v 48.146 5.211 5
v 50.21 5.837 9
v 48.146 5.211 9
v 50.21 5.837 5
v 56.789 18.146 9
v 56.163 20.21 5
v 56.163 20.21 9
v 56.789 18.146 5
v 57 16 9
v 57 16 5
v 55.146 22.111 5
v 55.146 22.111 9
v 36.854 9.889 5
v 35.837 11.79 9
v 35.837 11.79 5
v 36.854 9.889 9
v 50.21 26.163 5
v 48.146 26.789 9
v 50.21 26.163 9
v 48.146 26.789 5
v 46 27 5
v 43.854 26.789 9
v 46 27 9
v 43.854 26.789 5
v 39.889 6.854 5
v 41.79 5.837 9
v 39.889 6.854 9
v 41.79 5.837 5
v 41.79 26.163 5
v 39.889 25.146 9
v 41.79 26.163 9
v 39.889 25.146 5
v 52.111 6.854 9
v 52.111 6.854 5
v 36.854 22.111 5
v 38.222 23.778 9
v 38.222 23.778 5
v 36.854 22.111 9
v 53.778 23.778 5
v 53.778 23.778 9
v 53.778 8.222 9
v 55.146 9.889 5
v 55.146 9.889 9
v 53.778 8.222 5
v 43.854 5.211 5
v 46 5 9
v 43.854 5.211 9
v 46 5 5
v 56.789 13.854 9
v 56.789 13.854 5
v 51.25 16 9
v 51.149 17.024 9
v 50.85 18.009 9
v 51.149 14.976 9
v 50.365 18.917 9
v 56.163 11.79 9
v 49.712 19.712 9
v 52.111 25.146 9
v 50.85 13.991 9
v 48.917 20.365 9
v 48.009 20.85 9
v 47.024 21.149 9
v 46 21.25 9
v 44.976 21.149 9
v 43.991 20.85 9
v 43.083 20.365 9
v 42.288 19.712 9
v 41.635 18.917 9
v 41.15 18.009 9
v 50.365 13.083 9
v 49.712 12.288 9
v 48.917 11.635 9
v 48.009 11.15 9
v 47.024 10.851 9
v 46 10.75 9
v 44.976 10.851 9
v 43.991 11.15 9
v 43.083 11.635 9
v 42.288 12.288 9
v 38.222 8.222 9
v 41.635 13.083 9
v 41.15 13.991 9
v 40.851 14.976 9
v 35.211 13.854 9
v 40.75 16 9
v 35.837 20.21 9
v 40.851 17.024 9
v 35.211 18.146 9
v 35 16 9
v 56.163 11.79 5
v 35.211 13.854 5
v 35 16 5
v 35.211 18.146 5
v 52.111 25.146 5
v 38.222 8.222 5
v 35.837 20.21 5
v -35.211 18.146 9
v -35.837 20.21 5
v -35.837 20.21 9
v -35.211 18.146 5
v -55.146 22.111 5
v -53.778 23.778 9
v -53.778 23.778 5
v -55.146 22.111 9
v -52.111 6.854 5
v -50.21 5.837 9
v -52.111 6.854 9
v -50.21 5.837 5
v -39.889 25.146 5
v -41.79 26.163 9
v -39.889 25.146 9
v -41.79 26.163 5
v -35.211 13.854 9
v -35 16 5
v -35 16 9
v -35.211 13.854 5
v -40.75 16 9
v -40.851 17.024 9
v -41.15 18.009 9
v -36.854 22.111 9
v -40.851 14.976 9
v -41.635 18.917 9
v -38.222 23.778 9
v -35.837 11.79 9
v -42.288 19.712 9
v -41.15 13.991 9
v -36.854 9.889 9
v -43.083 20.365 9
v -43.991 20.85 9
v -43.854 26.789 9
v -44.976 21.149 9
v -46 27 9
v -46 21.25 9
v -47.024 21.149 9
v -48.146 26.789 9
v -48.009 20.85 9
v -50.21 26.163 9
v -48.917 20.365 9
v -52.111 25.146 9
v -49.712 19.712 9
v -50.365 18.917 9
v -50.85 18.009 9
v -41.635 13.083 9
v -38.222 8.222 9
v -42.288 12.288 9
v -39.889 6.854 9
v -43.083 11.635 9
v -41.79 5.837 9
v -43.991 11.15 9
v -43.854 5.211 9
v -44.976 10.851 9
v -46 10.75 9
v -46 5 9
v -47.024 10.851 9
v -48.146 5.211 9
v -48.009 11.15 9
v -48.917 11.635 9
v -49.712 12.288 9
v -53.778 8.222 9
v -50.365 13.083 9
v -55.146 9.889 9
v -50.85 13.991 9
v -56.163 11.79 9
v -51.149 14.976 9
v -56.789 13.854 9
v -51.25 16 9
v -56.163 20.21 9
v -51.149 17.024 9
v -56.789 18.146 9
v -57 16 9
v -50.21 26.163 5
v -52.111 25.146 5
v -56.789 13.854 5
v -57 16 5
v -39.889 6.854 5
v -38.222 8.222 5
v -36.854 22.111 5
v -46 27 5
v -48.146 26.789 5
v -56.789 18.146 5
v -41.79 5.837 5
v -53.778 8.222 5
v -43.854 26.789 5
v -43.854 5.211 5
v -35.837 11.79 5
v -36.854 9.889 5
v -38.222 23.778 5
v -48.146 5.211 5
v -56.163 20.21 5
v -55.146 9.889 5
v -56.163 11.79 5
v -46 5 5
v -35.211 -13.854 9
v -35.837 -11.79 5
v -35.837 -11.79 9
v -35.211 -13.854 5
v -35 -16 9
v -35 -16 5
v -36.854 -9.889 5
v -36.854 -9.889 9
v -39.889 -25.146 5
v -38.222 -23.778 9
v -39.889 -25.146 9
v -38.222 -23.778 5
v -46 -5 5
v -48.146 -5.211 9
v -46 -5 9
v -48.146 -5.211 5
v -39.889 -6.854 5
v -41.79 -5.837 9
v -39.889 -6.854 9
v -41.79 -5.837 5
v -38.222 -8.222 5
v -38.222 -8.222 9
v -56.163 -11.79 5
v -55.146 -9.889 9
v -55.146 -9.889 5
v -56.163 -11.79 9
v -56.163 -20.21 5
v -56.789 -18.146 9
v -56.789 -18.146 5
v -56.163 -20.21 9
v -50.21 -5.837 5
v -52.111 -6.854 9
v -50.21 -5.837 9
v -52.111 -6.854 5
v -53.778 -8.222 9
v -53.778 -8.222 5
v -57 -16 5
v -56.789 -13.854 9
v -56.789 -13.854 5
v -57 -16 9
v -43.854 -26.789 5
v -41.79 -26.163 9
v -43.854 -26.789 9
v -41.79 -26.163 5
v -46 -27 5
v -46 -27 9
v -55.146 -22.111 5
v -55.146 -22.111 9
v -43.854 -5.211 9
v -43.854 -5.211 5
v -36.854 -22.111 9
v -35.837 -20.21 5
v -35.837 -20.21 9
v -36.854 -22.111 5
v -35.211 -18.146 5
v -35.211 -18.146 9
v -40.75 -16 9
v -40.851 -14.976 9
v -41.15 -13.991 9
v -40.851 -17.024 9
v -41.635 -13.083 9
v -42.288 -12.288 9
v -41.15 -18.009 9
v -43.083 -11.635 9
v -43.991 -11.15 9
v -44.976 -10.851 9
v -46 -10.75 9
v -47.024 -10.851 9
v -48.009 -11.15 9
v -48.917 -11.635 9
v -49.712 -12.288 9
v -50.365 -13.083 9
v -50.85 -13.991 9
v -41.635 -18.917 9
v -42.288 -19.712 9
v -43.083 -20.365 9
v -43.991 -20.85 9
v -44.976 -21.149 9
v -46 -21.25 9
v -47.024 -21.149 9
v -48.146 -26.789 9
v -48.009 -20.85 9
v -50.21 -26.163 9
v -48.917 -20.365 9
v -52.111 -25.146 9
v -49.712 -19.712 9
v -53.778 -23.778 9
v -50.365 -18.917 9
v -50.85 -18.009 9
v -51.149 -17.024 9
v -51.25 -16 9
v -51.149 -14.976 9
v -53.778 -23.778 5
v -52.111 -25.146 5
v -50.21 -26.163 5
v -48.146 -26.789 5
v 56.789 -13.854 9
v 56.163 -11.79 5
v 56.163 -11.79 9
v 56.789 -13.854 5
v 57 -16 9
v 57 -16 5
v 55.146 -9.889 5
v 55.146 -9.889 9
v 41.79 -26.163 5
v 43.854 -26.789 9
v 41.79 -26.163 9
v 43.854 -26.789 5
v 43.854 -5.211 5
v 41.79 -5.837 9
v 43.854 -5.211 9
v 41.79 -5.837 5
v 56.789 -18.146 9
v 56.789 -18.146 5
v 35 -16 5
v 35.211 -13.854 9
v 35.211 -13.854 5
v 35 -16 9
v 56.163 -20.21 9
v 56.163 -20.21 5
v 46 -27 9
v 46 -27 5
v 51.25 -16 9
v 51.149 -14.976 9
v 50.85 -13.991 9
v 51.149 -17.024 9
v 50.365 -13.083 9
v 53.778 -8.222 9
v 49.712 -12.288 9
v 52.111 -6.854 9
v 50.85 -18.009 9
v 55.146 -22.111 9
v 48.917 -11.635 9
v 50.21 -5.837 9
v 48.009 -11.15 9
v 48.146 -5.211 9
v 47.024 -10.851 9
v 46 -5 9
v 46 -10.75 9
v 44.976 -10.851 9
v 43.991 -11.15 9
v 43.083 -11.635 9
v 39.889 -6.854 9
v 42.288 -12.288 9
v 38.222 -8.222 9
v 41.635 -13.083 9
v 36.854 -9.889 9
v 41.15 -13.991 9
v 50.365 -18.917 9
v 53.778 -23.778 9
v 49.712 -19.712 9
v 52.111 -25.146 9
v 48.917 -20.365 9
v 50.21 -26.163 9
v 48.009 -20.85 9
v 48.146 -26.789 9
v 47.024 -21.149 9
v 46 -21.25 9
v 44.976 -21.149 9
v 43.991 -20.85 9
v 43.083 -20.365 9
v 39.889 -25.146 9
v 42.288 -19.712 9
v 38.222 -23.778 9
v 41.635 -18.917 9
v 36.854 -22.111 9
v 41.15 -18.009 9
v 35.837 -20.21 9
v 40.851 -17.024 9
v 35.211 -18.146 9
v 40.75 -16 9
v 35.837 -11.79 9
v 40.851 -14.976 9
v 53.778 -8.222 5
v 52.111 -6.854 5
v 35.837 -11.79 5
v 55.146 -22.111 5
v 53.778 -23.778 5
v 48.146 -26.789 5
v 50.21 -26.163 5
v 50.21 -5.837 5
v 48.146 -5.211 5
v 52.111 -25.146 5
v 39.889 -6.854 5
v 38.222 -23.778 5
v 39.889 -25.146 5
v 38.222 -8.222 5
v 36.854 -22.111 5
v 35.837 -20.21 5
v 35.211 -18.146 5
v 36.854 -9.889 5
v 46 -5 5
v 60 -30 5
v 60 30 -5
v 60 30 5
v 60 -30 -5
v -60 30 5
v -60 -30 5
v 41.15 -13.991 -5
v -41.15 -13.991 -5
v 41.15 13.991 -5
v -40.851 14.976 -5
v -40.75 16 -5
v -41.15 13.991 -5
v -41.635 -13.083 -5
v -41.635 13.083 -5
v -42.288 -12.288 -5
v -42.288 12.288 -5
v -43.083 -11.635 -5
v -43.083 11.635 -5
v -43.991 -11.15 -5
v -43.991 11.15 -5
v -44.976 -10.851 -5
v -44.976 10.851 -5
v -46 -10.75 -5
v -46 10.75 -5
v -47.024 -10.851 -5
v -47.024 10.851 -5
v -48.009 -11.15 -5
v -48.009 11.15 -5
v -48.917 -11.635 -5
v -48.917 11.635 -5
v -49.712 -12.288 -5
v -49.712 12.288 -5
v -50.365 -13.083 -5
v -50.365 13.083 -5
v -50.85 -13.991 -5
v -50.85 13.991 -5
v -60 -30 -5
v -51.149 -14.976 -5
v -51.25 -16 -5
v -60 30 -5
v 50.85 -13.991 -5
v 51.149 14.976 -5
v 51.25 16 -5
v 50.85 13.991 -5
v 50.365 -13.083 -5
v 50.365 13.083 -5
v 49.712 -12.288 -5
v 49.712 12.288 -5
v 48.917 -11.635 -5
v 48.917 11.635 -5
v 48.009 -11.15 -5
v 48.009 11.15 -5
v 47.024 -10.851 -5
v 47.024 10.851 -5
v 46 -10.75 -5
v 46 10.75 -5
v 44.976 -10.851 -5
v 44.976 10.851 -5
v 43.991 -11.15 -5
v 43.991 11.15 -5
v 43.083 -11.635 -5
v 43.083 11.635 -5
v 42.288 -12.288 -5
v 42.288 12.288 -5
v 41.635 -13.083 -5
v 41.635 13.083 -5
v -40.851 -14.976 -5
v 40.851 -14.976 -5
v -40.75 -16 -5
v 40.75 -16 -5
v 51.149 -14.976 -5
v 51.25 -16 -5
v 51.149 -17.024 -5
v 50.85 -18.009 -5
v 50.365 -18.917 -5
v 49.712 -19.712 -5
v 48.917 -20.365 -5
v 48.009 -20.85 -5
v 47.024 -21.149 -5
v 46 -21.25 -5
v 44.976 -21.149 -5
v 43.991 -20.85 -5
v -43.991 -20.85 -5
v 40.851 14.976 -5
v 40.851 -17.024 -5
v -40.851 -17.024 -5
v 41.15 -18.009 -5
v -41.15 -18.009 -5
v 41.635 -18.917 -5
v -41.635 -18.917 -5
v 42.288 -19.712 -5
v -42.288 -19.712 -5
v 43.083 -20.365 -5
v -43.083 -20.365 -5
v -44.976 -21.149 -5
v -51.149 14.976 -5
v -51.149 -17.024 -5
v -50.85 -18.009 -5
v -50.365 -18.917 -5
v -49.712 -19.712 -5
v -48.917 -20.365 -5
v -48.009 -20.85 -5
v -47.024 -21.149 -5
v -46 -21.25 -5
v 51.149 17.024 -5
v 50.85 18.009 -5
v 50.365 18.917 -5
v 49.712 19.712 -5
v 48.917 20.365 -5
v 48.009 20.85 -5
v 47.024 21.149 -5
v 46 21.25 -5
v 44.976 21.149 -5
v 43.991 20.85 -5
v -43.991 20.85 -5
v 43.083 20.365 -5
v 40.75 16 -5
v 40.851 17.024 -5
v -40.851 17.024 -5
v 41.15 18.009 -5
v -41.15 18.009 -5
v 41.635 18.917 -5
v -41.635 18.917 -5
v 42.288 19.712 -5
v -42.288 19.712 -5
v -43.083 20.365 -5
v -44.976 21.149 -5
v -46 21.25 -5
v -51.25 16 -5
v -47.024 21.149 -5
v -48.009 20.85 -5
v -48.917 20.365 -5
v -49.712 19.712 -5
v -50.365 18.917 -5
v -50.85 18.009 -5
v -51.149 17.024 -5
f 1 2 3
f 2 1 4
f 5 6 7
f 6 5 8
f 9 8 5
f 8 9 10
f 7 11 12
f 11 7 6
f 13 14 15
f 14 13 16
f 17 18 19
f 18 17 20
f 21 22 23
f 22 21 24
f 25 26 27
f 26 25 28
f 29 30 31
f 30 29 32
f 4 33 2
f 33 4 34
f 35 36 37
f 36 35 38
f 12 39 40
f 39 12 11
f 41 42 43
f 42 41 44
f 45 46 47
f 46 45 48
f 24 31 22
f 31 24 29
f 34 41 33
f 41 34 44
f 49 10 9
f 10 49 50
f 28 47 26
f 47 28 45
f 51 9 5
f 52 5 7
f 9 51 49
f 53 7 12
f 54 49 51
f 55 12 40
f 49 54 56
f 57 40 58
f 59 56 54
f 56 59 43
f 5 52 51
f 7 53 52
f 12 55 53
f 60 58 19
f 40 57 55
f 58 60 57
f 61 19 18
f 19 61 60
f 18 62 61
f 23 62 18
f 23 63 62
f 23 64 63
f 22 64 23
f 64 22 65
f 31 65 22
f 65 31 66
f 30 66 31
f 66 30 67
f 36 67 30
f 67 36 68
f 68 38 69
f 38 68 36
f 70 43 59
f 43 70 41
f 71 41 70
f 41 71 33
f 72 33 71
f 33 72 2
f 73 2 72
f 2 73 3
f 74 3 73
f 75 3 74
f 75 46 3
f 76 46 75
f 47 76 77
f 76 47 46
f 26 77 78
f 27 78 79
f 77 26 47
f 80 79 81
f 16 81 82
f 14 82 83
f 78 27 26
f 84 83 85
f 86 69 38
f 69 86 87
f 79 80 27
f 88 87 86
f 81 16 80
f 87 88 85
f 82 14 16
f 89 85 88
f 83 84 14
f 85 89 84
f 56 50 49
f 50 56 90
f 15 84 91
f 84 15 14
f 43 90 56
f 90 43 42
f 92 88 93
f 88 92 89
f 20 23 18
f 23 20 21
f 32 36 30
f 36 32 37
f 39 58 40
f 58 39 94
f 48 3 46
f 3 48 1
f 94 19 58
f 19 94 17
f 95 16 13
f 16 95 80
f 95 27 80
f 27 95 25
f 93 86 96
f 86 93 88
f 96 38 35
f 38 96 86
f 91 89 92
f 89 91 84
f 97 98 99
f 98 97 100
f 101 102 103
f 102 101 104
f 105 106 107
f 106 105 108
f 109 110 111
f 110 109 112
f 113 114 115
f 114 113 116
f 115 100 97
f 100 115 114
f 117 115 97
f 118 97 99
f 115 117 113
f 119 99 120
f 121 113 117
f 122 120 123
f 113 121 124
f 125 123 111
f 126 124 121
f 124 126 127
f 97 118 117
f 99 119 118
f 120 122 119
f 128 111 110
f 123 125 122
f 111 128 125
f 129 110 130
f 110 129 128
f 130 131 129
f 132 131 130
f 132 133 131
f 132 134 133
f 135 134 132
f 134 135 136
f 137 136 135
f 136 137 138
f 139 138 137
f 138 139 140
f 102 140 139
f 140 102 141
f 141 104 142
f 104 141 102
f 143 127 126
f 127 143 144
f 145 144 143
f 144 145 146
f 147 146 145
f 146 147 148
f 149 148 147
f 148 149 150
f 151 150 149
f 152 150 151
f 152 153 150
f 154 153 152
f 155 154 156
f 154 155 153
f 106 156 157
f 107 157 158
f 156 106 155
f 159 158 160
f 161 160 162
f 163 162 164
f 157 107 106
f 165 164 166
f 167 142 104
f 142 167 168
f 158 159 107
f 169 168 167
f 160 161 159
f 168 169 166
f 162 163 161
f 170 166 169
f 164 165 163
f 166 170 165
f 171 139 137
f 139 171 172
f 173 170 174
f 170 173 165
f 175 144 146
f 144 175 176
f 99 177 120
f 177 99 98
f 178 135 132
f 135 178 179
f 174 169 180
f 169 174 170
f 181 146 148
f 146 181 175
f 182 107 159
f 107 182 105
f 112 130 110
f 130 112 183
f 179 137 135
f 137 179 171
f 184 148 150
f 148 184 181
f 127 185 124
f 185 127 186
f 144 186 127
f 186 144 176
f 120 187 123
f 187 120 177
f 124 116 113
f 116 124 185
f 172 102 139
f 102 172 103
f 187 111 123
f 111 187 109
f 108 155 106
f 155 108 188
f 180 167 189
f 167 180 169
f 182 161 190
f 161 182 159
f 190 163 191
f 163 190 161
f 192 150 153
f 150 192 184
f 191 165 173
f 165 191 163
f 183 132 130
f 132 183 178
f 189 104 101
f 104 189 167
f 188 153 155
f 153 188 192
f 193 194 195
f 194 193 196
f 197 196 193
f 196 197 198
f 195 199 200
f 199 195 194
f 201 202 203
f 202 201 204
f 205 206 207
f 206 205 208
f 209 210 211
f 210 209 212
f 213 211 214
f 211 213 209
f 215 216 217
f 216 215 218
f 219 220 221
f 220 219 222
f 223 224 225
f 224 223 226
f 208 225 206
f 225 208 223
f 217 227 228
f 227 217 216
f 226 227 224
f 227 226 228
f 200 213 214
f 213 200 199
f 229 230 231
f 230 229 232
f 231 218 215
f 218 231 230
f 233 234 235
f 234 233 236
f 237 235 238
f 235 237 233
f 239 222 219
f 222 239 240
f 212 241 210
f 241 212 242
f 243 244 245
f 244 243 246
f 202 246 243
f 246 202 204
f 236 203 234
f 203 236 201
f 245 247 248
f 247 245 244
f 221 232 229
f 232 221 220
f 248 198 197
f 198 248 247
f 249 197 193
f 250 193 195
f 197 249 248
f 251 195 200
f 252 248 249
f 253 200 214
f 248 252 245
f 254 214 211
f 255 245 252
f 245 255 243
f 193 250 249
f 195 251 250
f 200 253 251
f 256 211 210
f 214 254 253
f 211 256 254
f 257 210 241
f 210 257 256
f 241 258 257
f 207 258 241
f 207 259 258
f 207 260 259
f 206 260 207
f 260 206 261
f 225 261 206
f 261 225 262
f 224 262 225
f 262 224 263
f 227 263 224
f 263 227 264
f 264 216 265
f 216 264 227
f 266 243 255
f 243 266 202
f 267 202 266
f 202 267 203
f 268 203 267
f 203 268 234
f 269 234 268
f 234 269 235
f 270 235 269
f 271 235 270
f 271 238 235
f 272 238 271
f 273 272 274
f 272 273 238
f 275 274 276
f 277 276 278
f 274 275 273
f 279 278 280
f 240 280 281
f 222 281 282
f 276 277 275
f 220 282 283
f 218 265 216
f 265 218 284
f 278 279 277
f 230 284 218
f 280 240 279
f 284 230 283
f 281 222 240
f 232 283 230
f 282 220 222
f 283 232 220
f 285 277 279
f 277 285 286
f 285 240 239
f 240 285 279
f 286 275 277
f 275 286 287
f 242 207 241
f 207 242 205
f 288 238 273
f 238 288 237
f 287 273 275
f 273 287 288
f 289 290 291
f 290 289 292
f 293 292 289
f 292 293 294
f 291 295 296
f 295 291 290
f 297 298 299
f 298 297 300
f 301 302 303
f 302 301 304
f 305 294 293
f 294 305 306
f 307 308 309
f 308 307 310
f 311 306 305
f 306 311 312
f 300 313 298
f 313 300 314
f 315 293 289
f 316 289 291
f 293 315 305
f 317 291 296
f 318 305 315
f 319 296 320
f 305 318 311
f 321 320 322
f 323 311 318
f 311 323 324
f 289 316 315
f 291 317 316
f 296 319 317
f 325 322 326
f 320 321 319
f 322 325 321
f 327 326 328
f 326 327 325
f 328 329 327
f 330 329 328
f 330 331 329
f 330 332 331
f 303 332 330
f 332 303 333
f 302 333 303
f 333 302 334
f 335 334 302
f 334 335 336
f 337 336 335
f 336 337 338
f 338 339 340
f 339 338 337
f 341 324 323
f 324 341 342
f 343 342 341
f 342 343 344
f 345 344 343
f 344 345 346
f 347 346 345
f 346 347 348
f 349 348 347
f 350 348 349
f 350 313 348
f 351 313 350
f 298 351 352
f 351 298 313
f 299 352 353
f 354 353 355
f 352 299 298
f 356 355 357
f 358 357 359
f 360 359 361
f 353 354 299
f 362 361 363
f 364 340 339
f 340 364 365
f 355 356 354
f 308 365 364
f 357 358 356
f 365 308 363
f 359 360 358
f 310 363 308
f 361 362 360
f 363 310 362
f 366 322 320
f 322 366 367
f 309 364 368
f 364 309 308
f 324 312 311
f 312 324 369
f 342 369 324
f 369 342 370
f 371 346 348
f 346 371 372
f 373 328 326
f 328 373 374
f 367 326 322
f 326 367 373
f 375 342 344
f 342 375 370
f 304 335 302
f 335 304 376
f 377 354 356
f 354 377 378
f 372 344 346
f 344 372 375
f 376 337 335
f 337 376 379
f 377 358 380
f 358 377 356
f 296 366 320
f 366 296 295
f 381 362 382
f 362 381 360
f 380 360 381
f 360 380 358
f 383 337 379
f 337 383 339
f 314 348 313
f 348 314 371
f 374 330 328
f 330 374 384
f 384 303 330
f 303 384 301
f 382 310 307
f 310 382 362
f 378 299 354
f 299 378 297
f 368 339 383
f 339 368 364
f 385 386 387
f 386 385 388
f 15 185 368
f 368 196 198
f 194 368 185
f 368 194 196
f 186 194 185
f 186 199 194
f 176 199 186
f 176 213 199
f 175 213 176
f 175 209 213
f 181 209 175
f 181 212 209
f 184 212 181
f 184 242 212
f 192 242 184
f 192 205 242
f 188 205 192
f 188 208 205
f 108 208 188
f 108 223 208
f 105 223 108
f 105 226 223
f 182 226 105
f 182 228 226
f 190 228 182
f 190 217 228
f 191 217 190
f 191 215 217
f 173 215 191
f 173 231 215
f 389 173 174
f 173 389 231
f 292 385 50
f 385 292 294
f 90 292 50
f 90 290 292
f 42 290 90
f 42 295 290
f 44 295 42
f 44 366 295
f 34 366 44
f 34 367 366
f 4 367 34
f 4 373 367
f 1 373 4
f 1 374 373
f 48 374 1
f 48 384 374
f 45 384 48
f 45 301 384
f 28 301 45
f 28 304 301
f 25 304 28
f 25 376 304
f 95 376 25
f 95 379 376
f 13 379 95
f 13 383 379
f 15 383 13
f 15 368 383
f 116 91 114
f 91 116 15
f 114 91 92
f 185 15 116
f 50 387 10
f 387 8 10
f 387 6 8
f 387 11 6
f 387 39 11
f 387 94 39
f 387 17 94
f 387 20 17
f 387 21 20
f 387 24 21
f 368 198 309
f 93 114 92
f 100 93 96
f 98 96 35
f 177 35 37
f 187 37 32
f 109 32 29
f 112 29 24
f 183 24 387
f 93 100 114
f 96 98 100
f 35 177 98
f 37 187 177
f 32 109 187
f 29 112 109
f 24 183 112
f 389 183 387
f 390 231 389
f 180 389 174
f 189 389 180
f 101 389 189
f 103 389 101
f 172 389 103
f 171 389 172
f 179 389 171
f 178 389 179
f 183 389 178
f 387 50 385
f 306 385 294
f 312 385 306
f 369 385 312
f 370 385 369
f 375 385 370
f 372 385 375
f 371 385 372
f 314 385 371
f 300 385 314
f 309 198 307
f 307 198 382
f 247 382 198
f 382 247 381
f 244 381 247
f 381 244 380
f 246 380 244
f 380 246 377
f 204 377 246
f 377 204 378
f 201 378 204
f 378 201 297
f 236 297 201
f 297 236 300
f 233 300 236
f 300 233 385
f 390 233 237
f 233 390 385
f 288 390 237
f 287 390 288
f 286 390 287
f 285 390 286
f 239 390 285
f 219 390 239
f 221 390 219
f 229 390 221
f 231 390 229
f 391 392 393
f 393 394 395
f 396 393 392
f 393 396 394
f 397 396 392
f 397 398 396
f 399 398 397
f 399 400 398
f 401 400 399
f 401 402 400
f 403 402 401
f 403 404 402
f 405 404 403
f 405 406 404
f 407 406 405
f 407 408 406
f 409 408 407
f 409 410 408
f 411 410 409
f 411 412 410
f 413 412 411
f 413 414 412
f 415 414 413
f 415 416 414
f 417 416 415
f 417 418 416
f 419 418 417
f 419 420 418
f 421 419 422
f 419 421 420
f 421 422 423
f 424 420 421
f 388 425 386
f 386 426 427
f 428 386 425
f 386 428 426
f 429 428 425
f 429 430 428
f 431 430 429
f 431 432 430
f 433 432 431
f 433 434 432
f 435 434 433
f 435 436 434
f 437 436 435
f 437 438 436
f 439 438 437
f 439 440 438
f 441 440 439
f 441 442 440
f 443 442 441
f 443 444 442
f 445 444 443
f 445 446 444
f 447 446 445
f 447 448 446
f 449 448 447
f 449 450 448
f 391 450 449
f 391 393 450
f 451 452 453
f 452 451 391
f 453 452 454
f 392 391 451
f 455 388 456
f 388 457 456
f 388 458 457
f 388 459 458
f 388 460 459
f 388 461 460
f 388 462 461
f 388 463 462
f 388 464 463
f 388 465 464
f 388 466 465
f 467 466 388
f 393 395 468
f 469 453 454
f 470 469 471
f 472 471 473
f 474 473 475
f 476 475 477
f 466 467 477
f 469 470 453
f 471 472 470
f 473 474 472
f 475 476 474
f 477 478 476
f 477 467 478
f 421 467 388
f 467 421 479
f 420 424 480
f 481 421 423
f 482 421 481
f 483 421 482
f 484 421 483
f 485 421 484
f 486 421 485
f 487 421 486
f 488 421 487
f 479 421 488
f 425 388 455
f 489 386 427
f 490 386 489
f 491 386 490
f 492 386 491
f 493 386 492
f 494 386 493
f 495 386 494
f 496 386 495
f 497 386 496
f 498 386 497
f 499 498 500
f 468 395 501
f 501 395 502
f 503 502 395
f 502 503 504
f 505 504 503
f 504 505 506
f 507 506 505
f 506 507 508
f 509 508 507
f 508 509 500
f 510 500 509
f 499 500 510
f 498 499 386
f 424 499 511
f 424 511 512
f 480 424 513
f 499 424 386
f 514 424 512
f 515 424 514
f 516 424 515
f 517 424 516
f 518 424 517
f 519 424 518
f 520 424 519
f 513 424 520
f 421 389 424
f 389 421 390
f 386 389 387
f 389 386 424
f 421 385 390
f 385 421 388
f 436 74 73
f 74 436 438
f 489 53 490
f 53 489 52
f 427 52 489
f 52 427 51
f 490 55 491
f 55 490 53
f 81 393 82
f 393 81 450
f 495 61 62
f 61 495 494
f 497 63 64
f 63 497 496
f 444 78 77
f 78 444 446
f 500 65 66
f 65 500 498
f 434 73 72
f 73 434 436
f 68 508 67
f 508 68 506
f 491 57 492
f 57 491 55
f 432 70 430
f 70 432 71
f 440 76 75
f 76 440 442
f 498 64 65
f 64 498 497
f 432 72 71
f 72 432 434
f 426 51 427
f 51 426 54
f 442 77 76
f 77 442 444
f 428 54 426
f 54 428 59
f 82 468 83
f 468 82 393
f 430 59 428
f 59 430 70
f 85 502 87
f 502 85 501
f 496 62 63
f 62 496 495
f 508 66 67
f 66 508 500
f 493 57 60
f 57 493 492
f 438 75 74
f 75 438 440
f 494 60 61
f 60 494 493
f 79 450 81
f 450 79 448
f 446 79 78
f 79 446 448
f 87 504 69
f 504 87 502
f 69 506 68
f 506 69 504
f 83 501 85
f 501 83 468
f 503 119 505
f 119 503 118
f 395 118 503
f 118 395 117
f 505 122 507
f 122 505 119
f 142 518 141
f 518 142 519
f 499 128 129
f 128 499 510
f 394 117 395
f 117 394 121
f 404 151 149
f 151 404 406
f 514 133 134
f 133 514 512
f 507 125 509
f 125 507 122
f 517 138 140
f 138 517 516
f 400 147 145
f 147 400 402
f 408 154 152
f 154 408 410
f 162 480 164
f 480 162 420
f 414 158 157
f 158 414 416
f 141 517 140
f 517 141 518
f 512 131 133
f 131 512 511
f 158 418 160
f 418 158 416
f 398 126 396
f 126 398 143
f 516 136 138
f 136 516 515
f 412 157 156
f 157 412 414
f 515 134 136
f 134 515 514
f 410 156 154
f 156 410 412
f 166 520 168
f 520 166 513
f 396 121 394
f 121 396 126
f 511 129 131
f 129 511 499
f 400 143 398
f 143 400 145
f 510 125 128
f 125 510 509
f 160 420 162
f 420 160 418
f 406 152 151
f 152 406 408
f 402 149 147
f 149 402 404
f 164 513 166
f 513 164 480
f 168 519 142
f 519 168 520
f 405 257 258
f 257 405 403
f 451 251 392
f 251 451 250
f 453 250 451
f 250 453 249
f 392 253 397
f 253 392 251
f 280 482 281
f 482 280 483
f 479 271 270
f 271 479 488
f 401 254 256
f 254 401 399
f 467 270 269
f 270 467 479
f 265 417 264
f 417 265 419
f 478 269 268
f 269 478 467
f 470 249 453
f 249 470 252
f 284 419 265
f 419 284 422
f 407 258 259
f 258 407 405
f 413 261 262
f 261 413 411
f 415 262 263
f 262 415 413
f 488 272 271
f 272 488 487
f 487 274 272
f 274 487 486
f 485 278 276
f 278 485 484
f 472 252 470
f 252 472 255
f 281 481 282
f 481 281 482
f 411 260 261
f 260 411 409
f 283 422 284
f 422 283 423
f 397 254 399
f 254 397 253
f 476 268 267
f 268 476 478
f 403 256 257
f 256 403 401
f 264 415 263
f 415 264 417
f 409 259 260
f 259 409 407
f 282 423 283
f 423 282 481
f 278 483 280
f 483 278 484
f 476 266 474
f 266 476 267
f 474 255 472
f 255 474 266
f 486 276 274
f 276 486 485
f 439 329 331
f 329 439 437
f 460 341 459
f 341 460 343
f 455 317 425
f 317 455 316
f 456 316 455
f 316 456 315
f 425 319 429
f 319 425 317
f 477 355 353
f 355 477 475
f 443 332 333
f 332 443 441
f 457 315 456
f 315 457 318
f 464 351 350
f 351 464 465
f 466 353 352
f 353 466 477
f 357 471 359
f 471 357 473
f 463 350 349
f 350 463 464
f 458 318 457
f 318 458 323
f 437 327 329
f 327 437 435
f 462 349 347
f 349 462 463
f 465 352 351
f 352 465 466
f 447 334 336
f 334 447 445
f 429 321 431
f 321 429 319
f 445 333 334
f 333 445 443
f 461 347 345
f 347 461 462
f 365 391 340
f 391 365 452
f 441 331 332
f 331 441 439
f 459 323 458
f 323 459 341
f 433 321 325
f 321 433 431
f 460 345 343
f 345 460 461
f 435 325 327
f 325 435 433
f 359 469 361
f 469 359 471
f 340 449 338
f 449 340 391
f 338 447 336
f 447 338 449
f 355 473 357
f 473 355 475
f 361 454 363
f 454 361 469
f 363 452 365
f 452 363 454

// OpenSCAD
$fn = 32;

// ----------------------------------------------------------------------
// Anchor pads 120 x 60 x 14
// four corner bosses with anchor holes
// ----------------------------------------------------------------------

// --- parameters (mm) ---
plate = [120, 60, 10];  // base plate size (x, y, z)
pads = 4;               // boss count, one per corner
edge = 14;              // boss centre offset from the plate edge
boss_d = 22;            // boss diameter
boss_h = 4;             // boss height above the base plate
hole_d = 10.5;          // hole diameter

// --- derived feature positions (mm) ---
height = plate[2] + boss_h;      // = 14   overall height of the part
corner_x = plate[0] / 2 - edge;  // = 46   boss centre X
corner_y = plate[1] / 2 - edge;  // = 16   boss centre Y
feature_centers = [
  [corner_x, corner_y],
  [-corner_x, corner_y],
  [-corner_x, -corner_y],
  [corner_x, -corner_y]
];   // boss centres, anchor holes are drilled there

// base plate, four bosses standing on it, anchor holes all the way through
difference() {
  union() {
    cube(plate, center = true);
    for (centre = feature_centers)
      translate([centre[0], centre[1], plate[2] / 2 - 1])
        cylinder(d = boss_d, h = boss_h + 1);
  }
  for (centre = feature_centers)
    translate([centre[0], centre[1], -height])
      cylinder(d = hole_d, h = 2 * height + 2);  // through boss and plate
}
